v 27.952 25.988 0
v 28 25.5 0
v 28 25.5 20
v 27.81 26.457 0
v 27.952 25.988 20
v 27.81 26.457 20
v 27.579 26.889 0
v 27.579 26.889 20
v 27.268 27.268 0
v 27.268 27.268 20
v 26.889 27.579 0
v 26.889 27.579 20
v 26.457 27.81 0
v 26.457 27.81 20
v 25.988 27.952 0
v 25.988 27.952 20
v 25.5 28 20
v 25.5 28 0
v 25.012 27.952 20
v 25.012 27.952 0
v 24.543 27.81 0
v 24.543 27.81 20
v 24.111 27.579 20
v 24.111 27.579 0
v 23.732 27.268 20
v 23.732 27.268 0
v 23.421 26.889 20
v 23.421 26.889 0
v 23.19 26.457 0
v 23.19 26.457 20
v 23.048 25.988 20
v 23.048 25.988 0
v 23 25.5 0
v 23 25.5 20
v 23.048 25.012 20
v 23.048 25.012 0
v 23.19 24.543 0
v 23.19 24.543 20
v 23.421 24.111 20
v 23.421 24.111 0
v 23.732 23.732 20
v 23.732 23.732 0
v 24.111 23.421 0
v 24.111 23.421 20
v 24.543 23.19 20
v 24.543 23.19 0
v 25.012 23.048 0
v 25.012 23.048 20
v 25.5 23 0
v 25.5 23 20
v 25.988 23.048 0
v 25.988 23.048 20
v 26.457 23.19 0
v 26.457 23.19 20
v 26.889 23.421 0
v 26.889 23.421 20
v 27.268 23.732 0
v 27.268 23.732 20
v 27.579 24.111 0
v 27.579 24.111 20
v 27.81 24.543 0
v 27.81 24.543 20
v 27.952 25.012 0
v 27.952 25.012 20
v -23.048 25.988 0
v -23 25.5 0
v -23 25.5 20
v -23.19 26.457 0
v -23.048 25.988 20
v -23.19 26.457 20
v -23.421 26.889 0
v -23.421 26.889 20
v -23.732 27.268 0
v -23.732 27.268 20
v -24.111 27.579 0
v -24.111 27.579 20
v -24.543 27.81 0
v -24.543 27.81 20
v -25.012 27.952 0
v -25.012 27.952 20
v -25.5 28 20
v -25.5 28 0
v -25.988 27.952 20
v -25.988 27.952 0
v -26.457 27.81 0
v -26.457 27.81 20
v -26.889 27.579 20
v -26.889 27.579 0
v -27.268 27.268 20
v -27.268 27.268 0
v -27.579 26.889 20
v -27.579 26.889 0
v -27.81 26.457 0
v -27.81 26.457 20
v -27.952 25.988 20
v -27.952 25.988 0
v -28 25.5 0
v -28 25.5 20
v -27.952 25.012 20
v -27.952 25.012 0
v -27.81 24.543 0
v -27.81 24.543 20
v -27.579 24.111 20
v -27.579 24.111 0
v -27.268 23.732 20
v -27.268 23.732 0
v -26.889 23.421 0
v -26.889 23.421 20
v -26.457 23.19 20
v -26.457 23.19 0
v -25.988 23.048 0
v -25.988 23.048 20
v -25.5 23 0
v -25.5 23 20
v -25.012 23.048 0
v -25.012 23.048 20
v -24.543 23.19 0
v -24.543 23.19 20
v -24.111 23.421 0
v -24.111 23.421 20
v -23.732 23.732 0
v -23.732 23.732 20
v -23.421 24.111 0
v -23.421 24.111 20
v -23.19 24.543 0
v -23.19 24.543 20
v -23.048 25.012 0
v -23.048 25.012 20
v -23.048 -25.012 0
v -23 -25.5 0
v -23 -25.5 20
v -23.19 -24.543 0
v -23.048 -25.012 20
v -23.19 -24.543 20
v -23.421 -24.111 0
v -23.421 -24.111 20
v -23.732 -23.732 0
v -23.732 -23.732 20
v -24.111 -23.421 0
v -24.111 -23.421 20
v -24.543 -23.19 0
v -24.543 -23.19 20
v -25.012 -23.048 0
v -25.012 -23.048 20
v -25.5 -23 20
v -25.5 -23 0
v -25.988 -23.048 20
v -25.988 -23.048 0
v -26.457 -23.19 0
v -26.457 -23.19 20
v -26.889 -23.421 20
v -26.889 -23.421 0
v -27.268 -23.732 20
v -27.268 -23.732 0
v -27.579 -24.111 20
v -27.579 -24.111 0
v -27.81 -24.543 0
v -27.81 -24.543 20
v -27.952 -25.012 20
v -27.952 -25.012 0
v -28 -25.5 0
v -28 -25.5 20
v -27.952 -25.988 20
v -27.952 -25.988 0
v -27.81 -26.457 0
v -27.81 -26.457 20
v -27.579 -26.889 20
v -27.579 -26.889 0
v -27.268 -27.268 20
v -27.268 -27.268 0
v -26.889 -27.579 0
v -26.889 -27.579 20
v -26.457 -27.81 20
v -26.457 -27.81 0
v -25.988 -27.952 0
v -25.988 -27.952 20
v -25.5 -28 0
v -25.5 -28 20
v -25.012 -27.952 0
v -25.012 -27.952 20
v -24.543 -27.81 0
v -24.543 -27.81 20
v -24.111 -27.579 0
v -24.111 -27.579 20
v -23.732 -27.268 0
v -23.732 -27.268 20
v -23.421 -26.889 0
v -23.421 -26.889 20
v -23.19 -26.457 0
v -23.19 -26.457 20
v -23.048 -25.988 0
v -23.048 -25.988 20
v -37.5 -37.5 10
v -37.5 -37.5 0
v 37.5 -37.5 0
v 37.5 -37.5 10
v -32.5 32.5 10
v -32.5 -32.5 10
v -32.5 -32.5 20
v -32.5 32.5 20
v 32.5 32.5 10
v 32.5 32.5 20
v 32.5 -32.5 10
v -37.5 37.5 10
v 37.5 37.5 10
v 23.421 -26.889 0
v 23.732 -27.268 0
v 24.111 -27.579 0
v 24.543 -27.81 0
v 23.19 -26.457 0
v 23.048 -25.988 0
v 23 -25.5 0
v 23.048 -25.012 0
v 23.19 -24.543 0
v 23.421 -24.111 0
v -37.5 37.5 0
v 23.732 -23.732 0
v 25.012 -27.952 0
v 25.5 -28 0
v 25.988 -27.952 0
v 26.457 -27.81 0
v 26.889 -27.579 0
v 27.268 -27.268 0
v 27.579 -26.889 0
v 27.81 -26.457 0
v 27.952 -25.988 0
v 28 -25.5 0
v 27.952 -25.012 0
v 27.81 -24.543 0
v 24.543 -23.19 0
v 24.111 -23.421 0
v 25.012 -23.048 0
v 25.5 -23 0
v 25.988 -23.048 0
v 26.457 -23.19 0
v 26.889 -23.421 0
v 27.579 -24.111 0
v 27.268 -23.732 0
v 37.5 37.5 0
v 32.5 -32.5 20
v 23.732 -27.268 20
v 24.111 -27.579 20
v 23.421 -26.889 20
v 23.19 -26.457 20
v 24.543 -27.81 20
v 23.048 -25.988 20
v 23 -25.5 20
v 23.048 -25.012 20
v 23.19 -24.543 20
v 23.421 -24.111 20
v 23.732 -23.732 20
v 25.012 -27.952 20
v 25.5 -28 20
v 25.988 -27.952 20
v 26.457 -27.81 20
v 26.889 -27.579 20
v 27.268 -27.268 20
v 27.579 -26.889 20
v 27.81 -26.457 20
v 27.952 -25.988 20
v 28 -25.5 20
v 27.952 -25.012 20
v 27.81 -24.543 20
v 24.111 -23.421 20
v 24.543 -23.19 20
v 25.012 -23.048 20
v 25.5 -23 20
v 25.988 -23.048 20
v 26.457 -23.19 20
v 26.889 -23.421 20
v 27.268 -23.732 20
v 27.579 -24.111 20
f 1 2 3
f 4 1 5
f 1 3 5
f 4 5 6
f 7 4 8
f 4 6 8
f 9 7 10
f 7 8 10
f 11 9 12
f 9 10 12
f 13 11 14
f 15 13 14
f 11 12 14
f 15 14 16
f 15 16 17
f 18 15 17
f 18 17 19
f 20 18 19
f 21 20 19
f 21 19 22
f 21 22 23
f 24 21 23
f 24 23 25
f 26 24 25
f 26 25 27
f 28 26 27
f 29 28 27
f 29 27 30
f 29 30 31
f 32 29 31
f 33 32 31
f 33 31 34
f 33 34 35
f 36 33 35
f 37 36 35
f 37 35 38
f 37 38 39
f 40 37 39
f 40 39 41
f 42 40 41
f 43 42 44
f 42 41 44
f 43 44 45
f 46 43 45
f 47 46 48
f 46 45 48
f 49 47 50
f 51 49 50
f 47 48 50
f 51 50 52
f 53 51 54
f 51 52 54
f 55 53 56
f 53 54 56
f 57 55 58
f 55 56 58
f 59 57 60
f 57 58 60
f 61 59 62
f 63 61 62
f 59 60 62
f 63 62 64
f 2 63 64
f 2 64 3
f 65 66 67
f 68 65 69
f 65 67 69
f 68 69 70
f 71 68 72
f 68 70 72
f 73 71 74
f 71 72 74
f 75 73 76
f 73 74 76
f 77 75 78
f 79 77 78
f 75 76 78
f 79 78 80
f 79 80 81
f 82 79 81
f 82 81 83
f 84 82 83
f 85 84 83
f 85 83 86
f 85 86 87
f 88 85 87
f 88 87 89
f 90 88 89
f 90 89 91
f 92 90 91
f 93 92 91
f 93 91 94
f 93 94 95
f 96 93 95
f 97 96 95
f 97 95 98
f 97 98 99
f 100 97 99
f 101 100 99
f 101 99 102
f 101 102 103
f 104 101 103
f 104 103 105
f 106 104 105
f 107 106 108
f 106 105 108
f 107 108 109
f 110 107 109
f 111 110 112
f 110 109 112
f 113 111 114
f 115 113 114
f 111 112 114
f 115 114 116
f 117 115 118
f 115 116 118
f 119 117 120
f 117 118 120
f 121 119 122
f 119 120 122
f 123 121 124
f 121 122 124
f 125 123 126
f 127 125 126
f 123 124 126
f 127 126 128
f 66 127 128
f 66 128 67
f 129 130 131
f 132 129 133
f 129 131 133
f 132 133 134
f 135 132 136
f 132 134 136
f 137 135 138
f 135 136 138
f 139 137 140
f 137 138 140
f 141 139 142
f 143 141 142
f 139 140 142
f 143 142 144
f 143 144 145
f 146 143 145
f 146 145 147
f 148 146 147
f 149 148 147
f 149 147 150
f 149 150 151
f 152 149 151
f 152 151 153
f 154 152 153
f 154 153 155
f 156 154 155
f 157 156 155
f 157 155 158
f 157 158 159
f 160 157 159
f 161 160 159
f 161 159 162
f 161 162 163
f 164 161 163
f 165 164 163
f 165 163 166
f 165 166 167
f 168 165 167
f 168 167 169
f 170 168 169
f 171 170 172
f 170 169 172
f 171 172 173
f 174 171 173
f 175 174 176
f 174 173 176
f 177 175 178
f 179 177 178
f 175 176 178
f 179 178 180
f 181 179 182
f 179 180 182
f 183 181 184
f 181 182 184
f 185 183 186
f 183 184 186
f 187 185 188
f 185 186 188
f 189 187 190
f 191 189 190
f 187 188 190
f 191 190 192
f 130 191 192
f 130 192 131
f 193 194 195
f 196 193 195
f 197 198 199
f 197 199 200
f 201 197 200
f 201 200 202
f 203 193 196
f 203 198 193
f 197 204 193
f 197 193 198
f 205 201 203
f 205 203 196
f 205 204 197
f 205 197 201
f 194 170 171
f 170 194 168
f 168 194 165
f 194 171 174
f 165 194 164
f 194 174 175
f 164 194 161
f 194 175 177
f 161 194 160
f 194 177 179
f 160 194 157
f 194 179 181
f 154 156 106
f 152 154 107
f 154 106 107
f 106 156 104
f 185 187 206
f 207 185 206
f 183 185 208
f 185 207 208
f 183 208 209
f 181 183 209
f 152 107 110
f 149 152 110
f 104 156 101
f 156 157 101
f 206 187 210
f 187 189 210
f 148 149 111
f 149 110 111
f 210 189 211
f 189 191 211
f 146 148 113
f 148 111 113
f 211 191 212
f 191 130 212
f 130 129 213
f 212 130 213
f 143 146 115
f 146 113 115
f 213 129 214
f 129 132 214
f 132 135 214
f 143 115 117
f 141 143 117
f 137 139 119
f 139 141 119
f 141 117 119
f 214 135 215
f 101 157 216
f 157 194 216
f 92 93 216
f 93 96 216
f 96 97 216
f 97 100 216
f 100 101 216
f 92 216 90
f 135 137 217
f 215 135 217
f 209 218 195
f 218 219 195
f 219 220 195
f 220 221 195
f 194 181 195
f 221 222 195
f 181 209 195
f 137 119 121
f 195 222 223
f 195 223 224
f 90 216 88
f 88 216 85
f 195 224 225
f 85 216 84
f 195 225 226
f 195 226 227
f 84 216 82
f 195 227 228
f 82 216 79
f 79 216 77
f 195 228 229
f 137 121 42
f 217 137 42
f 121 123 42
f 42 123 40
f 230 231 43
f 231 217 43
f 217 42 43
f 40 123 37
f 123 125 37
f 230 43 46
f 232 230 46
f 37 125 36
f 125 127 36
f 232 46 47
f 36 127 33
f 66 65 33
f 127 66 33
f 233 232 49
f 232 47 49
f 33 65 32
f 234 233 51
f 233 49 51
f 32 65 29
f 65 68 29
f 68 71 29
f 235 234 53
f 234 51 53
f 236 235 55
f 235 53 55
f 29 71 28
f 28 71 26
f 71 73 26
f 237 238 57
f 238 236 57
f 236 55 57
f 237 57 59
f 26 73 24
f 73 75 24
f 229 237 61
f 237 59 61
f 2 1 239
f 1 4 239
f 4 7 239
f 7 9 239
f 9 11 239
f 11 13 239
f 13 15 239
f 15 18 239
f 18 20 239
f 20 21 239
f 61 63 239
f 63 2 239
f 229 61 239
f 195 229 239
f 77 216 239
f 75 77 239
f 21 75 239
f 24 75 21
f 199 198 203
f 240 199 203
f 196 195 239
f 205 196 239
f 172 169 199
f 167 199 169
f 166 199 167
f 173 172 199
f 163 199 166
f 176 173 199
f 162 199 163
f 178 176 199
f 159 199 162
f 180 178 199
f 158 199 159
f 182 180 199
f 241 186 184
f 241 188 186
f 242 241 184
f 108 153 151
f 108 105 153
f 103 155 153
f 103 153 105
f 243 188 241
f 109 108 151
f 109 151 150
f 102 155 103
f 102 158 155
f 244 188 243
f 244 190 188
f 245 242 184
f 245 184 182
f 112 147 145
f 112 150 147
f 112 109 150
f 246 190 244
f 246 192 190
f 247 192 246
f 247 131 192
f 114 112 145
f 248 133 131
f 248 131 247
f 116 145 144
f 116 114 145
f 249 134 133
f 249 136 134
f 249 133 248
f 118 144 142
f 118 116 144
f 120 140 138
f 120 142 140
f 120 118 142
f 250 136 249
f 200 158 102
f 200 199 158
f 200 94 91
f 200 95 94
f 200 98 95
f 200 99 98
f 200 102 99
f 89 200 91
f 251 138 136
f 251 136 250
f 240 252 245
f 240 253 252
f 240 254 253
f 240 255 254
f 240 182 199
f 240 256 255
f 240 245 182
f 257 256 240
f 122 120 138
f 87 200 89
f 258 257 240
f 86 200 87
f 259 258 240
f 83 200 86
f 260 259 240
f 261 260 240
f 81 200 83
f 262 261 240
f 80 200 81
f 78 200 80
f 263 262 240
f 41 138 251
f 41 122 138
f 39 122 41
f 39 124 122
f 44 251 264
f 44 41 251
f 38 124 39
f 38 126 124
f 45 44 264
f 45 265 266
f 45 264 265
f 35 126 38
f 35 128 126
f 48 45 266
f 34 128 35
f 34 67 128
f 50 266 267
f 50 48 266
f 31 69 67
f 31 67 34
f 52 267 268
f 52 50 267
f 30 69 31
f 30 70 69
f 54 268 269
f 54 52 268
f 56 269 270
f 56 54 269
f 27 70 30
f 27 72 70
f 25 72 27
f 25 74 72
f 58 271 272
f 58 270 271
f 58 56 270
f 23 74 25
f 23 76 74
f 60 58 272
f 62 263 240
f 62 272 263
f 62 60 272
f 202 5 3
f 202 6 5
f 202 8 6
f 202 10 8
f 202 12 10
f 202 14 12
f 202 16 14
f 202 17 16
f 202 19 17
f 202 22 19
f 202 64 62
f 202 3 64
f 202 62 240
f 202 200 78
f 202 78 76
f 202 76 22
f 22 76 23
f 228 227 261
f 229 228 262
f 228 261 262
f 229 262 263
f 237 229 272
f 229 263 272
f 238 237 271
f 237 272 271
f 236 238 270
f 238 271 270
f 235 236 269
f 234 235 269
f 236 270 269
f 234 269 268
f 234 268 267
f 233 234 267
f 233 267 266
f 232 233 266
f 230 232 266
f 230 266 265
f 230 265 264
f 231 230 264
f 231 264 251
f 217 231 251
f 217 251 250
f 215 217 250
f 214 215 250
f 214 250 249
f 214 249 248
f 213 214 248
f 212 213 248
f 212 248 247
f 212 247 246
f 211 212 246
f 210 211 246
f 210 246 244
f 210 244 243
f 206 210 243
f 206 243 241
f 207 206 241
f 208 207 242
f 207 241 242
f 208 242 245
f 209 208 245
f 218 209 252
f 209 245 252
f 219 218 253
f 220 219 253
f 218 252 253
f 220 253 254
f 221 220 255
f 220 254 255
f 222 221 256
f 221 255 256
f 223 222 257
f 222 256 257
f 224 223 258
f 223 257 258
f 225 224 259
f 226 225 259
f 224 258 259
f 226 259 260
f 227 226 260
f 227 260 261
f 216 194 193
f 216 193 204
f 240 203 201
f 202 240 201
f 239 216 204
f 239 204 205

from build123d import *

# Parameters (mm, degrees)
F0_W     = 75
F0_H     = 75
F1_DEPTH = 10
F2_W     = 65
F2_H     = 65
F3_DEPTH = 10
F4_R     = 2.5
F5_DEPTH = 20.001


with BuildPart() as f1:
    # F0 (on Top) → F1 (new body)
    with BuildSketch(Plane.XY):
        Rectangle(F0_W, F0_H)
    extrude(amount=F1_DEPTH)

    # F2 (on face) → F3 (join)
    with BuildSketch(Plane.XY.offset(10)):
        Rectangle(F2_W, F2_H)
    extrude(amount=F3_DEPTH)

    # F4 (on face) → F5 (cut, through all)
    with BuildSketch(Plane.XY.offset(20)):
        with Locations((-25.5, 25.5)):
            Circle(F4_R)
        with Locations((25.5, 25.5)):
            Circle(F4_R)
        with Locations((25.5, -25.5)):
            Circle(F4_R)
        with Locations((-25.5, -25.5)):
            Circle(F4_R)
    extrude(amount=-F5_DEPTH, mode=Mode.SUBTRACT)


solid = f1.part
